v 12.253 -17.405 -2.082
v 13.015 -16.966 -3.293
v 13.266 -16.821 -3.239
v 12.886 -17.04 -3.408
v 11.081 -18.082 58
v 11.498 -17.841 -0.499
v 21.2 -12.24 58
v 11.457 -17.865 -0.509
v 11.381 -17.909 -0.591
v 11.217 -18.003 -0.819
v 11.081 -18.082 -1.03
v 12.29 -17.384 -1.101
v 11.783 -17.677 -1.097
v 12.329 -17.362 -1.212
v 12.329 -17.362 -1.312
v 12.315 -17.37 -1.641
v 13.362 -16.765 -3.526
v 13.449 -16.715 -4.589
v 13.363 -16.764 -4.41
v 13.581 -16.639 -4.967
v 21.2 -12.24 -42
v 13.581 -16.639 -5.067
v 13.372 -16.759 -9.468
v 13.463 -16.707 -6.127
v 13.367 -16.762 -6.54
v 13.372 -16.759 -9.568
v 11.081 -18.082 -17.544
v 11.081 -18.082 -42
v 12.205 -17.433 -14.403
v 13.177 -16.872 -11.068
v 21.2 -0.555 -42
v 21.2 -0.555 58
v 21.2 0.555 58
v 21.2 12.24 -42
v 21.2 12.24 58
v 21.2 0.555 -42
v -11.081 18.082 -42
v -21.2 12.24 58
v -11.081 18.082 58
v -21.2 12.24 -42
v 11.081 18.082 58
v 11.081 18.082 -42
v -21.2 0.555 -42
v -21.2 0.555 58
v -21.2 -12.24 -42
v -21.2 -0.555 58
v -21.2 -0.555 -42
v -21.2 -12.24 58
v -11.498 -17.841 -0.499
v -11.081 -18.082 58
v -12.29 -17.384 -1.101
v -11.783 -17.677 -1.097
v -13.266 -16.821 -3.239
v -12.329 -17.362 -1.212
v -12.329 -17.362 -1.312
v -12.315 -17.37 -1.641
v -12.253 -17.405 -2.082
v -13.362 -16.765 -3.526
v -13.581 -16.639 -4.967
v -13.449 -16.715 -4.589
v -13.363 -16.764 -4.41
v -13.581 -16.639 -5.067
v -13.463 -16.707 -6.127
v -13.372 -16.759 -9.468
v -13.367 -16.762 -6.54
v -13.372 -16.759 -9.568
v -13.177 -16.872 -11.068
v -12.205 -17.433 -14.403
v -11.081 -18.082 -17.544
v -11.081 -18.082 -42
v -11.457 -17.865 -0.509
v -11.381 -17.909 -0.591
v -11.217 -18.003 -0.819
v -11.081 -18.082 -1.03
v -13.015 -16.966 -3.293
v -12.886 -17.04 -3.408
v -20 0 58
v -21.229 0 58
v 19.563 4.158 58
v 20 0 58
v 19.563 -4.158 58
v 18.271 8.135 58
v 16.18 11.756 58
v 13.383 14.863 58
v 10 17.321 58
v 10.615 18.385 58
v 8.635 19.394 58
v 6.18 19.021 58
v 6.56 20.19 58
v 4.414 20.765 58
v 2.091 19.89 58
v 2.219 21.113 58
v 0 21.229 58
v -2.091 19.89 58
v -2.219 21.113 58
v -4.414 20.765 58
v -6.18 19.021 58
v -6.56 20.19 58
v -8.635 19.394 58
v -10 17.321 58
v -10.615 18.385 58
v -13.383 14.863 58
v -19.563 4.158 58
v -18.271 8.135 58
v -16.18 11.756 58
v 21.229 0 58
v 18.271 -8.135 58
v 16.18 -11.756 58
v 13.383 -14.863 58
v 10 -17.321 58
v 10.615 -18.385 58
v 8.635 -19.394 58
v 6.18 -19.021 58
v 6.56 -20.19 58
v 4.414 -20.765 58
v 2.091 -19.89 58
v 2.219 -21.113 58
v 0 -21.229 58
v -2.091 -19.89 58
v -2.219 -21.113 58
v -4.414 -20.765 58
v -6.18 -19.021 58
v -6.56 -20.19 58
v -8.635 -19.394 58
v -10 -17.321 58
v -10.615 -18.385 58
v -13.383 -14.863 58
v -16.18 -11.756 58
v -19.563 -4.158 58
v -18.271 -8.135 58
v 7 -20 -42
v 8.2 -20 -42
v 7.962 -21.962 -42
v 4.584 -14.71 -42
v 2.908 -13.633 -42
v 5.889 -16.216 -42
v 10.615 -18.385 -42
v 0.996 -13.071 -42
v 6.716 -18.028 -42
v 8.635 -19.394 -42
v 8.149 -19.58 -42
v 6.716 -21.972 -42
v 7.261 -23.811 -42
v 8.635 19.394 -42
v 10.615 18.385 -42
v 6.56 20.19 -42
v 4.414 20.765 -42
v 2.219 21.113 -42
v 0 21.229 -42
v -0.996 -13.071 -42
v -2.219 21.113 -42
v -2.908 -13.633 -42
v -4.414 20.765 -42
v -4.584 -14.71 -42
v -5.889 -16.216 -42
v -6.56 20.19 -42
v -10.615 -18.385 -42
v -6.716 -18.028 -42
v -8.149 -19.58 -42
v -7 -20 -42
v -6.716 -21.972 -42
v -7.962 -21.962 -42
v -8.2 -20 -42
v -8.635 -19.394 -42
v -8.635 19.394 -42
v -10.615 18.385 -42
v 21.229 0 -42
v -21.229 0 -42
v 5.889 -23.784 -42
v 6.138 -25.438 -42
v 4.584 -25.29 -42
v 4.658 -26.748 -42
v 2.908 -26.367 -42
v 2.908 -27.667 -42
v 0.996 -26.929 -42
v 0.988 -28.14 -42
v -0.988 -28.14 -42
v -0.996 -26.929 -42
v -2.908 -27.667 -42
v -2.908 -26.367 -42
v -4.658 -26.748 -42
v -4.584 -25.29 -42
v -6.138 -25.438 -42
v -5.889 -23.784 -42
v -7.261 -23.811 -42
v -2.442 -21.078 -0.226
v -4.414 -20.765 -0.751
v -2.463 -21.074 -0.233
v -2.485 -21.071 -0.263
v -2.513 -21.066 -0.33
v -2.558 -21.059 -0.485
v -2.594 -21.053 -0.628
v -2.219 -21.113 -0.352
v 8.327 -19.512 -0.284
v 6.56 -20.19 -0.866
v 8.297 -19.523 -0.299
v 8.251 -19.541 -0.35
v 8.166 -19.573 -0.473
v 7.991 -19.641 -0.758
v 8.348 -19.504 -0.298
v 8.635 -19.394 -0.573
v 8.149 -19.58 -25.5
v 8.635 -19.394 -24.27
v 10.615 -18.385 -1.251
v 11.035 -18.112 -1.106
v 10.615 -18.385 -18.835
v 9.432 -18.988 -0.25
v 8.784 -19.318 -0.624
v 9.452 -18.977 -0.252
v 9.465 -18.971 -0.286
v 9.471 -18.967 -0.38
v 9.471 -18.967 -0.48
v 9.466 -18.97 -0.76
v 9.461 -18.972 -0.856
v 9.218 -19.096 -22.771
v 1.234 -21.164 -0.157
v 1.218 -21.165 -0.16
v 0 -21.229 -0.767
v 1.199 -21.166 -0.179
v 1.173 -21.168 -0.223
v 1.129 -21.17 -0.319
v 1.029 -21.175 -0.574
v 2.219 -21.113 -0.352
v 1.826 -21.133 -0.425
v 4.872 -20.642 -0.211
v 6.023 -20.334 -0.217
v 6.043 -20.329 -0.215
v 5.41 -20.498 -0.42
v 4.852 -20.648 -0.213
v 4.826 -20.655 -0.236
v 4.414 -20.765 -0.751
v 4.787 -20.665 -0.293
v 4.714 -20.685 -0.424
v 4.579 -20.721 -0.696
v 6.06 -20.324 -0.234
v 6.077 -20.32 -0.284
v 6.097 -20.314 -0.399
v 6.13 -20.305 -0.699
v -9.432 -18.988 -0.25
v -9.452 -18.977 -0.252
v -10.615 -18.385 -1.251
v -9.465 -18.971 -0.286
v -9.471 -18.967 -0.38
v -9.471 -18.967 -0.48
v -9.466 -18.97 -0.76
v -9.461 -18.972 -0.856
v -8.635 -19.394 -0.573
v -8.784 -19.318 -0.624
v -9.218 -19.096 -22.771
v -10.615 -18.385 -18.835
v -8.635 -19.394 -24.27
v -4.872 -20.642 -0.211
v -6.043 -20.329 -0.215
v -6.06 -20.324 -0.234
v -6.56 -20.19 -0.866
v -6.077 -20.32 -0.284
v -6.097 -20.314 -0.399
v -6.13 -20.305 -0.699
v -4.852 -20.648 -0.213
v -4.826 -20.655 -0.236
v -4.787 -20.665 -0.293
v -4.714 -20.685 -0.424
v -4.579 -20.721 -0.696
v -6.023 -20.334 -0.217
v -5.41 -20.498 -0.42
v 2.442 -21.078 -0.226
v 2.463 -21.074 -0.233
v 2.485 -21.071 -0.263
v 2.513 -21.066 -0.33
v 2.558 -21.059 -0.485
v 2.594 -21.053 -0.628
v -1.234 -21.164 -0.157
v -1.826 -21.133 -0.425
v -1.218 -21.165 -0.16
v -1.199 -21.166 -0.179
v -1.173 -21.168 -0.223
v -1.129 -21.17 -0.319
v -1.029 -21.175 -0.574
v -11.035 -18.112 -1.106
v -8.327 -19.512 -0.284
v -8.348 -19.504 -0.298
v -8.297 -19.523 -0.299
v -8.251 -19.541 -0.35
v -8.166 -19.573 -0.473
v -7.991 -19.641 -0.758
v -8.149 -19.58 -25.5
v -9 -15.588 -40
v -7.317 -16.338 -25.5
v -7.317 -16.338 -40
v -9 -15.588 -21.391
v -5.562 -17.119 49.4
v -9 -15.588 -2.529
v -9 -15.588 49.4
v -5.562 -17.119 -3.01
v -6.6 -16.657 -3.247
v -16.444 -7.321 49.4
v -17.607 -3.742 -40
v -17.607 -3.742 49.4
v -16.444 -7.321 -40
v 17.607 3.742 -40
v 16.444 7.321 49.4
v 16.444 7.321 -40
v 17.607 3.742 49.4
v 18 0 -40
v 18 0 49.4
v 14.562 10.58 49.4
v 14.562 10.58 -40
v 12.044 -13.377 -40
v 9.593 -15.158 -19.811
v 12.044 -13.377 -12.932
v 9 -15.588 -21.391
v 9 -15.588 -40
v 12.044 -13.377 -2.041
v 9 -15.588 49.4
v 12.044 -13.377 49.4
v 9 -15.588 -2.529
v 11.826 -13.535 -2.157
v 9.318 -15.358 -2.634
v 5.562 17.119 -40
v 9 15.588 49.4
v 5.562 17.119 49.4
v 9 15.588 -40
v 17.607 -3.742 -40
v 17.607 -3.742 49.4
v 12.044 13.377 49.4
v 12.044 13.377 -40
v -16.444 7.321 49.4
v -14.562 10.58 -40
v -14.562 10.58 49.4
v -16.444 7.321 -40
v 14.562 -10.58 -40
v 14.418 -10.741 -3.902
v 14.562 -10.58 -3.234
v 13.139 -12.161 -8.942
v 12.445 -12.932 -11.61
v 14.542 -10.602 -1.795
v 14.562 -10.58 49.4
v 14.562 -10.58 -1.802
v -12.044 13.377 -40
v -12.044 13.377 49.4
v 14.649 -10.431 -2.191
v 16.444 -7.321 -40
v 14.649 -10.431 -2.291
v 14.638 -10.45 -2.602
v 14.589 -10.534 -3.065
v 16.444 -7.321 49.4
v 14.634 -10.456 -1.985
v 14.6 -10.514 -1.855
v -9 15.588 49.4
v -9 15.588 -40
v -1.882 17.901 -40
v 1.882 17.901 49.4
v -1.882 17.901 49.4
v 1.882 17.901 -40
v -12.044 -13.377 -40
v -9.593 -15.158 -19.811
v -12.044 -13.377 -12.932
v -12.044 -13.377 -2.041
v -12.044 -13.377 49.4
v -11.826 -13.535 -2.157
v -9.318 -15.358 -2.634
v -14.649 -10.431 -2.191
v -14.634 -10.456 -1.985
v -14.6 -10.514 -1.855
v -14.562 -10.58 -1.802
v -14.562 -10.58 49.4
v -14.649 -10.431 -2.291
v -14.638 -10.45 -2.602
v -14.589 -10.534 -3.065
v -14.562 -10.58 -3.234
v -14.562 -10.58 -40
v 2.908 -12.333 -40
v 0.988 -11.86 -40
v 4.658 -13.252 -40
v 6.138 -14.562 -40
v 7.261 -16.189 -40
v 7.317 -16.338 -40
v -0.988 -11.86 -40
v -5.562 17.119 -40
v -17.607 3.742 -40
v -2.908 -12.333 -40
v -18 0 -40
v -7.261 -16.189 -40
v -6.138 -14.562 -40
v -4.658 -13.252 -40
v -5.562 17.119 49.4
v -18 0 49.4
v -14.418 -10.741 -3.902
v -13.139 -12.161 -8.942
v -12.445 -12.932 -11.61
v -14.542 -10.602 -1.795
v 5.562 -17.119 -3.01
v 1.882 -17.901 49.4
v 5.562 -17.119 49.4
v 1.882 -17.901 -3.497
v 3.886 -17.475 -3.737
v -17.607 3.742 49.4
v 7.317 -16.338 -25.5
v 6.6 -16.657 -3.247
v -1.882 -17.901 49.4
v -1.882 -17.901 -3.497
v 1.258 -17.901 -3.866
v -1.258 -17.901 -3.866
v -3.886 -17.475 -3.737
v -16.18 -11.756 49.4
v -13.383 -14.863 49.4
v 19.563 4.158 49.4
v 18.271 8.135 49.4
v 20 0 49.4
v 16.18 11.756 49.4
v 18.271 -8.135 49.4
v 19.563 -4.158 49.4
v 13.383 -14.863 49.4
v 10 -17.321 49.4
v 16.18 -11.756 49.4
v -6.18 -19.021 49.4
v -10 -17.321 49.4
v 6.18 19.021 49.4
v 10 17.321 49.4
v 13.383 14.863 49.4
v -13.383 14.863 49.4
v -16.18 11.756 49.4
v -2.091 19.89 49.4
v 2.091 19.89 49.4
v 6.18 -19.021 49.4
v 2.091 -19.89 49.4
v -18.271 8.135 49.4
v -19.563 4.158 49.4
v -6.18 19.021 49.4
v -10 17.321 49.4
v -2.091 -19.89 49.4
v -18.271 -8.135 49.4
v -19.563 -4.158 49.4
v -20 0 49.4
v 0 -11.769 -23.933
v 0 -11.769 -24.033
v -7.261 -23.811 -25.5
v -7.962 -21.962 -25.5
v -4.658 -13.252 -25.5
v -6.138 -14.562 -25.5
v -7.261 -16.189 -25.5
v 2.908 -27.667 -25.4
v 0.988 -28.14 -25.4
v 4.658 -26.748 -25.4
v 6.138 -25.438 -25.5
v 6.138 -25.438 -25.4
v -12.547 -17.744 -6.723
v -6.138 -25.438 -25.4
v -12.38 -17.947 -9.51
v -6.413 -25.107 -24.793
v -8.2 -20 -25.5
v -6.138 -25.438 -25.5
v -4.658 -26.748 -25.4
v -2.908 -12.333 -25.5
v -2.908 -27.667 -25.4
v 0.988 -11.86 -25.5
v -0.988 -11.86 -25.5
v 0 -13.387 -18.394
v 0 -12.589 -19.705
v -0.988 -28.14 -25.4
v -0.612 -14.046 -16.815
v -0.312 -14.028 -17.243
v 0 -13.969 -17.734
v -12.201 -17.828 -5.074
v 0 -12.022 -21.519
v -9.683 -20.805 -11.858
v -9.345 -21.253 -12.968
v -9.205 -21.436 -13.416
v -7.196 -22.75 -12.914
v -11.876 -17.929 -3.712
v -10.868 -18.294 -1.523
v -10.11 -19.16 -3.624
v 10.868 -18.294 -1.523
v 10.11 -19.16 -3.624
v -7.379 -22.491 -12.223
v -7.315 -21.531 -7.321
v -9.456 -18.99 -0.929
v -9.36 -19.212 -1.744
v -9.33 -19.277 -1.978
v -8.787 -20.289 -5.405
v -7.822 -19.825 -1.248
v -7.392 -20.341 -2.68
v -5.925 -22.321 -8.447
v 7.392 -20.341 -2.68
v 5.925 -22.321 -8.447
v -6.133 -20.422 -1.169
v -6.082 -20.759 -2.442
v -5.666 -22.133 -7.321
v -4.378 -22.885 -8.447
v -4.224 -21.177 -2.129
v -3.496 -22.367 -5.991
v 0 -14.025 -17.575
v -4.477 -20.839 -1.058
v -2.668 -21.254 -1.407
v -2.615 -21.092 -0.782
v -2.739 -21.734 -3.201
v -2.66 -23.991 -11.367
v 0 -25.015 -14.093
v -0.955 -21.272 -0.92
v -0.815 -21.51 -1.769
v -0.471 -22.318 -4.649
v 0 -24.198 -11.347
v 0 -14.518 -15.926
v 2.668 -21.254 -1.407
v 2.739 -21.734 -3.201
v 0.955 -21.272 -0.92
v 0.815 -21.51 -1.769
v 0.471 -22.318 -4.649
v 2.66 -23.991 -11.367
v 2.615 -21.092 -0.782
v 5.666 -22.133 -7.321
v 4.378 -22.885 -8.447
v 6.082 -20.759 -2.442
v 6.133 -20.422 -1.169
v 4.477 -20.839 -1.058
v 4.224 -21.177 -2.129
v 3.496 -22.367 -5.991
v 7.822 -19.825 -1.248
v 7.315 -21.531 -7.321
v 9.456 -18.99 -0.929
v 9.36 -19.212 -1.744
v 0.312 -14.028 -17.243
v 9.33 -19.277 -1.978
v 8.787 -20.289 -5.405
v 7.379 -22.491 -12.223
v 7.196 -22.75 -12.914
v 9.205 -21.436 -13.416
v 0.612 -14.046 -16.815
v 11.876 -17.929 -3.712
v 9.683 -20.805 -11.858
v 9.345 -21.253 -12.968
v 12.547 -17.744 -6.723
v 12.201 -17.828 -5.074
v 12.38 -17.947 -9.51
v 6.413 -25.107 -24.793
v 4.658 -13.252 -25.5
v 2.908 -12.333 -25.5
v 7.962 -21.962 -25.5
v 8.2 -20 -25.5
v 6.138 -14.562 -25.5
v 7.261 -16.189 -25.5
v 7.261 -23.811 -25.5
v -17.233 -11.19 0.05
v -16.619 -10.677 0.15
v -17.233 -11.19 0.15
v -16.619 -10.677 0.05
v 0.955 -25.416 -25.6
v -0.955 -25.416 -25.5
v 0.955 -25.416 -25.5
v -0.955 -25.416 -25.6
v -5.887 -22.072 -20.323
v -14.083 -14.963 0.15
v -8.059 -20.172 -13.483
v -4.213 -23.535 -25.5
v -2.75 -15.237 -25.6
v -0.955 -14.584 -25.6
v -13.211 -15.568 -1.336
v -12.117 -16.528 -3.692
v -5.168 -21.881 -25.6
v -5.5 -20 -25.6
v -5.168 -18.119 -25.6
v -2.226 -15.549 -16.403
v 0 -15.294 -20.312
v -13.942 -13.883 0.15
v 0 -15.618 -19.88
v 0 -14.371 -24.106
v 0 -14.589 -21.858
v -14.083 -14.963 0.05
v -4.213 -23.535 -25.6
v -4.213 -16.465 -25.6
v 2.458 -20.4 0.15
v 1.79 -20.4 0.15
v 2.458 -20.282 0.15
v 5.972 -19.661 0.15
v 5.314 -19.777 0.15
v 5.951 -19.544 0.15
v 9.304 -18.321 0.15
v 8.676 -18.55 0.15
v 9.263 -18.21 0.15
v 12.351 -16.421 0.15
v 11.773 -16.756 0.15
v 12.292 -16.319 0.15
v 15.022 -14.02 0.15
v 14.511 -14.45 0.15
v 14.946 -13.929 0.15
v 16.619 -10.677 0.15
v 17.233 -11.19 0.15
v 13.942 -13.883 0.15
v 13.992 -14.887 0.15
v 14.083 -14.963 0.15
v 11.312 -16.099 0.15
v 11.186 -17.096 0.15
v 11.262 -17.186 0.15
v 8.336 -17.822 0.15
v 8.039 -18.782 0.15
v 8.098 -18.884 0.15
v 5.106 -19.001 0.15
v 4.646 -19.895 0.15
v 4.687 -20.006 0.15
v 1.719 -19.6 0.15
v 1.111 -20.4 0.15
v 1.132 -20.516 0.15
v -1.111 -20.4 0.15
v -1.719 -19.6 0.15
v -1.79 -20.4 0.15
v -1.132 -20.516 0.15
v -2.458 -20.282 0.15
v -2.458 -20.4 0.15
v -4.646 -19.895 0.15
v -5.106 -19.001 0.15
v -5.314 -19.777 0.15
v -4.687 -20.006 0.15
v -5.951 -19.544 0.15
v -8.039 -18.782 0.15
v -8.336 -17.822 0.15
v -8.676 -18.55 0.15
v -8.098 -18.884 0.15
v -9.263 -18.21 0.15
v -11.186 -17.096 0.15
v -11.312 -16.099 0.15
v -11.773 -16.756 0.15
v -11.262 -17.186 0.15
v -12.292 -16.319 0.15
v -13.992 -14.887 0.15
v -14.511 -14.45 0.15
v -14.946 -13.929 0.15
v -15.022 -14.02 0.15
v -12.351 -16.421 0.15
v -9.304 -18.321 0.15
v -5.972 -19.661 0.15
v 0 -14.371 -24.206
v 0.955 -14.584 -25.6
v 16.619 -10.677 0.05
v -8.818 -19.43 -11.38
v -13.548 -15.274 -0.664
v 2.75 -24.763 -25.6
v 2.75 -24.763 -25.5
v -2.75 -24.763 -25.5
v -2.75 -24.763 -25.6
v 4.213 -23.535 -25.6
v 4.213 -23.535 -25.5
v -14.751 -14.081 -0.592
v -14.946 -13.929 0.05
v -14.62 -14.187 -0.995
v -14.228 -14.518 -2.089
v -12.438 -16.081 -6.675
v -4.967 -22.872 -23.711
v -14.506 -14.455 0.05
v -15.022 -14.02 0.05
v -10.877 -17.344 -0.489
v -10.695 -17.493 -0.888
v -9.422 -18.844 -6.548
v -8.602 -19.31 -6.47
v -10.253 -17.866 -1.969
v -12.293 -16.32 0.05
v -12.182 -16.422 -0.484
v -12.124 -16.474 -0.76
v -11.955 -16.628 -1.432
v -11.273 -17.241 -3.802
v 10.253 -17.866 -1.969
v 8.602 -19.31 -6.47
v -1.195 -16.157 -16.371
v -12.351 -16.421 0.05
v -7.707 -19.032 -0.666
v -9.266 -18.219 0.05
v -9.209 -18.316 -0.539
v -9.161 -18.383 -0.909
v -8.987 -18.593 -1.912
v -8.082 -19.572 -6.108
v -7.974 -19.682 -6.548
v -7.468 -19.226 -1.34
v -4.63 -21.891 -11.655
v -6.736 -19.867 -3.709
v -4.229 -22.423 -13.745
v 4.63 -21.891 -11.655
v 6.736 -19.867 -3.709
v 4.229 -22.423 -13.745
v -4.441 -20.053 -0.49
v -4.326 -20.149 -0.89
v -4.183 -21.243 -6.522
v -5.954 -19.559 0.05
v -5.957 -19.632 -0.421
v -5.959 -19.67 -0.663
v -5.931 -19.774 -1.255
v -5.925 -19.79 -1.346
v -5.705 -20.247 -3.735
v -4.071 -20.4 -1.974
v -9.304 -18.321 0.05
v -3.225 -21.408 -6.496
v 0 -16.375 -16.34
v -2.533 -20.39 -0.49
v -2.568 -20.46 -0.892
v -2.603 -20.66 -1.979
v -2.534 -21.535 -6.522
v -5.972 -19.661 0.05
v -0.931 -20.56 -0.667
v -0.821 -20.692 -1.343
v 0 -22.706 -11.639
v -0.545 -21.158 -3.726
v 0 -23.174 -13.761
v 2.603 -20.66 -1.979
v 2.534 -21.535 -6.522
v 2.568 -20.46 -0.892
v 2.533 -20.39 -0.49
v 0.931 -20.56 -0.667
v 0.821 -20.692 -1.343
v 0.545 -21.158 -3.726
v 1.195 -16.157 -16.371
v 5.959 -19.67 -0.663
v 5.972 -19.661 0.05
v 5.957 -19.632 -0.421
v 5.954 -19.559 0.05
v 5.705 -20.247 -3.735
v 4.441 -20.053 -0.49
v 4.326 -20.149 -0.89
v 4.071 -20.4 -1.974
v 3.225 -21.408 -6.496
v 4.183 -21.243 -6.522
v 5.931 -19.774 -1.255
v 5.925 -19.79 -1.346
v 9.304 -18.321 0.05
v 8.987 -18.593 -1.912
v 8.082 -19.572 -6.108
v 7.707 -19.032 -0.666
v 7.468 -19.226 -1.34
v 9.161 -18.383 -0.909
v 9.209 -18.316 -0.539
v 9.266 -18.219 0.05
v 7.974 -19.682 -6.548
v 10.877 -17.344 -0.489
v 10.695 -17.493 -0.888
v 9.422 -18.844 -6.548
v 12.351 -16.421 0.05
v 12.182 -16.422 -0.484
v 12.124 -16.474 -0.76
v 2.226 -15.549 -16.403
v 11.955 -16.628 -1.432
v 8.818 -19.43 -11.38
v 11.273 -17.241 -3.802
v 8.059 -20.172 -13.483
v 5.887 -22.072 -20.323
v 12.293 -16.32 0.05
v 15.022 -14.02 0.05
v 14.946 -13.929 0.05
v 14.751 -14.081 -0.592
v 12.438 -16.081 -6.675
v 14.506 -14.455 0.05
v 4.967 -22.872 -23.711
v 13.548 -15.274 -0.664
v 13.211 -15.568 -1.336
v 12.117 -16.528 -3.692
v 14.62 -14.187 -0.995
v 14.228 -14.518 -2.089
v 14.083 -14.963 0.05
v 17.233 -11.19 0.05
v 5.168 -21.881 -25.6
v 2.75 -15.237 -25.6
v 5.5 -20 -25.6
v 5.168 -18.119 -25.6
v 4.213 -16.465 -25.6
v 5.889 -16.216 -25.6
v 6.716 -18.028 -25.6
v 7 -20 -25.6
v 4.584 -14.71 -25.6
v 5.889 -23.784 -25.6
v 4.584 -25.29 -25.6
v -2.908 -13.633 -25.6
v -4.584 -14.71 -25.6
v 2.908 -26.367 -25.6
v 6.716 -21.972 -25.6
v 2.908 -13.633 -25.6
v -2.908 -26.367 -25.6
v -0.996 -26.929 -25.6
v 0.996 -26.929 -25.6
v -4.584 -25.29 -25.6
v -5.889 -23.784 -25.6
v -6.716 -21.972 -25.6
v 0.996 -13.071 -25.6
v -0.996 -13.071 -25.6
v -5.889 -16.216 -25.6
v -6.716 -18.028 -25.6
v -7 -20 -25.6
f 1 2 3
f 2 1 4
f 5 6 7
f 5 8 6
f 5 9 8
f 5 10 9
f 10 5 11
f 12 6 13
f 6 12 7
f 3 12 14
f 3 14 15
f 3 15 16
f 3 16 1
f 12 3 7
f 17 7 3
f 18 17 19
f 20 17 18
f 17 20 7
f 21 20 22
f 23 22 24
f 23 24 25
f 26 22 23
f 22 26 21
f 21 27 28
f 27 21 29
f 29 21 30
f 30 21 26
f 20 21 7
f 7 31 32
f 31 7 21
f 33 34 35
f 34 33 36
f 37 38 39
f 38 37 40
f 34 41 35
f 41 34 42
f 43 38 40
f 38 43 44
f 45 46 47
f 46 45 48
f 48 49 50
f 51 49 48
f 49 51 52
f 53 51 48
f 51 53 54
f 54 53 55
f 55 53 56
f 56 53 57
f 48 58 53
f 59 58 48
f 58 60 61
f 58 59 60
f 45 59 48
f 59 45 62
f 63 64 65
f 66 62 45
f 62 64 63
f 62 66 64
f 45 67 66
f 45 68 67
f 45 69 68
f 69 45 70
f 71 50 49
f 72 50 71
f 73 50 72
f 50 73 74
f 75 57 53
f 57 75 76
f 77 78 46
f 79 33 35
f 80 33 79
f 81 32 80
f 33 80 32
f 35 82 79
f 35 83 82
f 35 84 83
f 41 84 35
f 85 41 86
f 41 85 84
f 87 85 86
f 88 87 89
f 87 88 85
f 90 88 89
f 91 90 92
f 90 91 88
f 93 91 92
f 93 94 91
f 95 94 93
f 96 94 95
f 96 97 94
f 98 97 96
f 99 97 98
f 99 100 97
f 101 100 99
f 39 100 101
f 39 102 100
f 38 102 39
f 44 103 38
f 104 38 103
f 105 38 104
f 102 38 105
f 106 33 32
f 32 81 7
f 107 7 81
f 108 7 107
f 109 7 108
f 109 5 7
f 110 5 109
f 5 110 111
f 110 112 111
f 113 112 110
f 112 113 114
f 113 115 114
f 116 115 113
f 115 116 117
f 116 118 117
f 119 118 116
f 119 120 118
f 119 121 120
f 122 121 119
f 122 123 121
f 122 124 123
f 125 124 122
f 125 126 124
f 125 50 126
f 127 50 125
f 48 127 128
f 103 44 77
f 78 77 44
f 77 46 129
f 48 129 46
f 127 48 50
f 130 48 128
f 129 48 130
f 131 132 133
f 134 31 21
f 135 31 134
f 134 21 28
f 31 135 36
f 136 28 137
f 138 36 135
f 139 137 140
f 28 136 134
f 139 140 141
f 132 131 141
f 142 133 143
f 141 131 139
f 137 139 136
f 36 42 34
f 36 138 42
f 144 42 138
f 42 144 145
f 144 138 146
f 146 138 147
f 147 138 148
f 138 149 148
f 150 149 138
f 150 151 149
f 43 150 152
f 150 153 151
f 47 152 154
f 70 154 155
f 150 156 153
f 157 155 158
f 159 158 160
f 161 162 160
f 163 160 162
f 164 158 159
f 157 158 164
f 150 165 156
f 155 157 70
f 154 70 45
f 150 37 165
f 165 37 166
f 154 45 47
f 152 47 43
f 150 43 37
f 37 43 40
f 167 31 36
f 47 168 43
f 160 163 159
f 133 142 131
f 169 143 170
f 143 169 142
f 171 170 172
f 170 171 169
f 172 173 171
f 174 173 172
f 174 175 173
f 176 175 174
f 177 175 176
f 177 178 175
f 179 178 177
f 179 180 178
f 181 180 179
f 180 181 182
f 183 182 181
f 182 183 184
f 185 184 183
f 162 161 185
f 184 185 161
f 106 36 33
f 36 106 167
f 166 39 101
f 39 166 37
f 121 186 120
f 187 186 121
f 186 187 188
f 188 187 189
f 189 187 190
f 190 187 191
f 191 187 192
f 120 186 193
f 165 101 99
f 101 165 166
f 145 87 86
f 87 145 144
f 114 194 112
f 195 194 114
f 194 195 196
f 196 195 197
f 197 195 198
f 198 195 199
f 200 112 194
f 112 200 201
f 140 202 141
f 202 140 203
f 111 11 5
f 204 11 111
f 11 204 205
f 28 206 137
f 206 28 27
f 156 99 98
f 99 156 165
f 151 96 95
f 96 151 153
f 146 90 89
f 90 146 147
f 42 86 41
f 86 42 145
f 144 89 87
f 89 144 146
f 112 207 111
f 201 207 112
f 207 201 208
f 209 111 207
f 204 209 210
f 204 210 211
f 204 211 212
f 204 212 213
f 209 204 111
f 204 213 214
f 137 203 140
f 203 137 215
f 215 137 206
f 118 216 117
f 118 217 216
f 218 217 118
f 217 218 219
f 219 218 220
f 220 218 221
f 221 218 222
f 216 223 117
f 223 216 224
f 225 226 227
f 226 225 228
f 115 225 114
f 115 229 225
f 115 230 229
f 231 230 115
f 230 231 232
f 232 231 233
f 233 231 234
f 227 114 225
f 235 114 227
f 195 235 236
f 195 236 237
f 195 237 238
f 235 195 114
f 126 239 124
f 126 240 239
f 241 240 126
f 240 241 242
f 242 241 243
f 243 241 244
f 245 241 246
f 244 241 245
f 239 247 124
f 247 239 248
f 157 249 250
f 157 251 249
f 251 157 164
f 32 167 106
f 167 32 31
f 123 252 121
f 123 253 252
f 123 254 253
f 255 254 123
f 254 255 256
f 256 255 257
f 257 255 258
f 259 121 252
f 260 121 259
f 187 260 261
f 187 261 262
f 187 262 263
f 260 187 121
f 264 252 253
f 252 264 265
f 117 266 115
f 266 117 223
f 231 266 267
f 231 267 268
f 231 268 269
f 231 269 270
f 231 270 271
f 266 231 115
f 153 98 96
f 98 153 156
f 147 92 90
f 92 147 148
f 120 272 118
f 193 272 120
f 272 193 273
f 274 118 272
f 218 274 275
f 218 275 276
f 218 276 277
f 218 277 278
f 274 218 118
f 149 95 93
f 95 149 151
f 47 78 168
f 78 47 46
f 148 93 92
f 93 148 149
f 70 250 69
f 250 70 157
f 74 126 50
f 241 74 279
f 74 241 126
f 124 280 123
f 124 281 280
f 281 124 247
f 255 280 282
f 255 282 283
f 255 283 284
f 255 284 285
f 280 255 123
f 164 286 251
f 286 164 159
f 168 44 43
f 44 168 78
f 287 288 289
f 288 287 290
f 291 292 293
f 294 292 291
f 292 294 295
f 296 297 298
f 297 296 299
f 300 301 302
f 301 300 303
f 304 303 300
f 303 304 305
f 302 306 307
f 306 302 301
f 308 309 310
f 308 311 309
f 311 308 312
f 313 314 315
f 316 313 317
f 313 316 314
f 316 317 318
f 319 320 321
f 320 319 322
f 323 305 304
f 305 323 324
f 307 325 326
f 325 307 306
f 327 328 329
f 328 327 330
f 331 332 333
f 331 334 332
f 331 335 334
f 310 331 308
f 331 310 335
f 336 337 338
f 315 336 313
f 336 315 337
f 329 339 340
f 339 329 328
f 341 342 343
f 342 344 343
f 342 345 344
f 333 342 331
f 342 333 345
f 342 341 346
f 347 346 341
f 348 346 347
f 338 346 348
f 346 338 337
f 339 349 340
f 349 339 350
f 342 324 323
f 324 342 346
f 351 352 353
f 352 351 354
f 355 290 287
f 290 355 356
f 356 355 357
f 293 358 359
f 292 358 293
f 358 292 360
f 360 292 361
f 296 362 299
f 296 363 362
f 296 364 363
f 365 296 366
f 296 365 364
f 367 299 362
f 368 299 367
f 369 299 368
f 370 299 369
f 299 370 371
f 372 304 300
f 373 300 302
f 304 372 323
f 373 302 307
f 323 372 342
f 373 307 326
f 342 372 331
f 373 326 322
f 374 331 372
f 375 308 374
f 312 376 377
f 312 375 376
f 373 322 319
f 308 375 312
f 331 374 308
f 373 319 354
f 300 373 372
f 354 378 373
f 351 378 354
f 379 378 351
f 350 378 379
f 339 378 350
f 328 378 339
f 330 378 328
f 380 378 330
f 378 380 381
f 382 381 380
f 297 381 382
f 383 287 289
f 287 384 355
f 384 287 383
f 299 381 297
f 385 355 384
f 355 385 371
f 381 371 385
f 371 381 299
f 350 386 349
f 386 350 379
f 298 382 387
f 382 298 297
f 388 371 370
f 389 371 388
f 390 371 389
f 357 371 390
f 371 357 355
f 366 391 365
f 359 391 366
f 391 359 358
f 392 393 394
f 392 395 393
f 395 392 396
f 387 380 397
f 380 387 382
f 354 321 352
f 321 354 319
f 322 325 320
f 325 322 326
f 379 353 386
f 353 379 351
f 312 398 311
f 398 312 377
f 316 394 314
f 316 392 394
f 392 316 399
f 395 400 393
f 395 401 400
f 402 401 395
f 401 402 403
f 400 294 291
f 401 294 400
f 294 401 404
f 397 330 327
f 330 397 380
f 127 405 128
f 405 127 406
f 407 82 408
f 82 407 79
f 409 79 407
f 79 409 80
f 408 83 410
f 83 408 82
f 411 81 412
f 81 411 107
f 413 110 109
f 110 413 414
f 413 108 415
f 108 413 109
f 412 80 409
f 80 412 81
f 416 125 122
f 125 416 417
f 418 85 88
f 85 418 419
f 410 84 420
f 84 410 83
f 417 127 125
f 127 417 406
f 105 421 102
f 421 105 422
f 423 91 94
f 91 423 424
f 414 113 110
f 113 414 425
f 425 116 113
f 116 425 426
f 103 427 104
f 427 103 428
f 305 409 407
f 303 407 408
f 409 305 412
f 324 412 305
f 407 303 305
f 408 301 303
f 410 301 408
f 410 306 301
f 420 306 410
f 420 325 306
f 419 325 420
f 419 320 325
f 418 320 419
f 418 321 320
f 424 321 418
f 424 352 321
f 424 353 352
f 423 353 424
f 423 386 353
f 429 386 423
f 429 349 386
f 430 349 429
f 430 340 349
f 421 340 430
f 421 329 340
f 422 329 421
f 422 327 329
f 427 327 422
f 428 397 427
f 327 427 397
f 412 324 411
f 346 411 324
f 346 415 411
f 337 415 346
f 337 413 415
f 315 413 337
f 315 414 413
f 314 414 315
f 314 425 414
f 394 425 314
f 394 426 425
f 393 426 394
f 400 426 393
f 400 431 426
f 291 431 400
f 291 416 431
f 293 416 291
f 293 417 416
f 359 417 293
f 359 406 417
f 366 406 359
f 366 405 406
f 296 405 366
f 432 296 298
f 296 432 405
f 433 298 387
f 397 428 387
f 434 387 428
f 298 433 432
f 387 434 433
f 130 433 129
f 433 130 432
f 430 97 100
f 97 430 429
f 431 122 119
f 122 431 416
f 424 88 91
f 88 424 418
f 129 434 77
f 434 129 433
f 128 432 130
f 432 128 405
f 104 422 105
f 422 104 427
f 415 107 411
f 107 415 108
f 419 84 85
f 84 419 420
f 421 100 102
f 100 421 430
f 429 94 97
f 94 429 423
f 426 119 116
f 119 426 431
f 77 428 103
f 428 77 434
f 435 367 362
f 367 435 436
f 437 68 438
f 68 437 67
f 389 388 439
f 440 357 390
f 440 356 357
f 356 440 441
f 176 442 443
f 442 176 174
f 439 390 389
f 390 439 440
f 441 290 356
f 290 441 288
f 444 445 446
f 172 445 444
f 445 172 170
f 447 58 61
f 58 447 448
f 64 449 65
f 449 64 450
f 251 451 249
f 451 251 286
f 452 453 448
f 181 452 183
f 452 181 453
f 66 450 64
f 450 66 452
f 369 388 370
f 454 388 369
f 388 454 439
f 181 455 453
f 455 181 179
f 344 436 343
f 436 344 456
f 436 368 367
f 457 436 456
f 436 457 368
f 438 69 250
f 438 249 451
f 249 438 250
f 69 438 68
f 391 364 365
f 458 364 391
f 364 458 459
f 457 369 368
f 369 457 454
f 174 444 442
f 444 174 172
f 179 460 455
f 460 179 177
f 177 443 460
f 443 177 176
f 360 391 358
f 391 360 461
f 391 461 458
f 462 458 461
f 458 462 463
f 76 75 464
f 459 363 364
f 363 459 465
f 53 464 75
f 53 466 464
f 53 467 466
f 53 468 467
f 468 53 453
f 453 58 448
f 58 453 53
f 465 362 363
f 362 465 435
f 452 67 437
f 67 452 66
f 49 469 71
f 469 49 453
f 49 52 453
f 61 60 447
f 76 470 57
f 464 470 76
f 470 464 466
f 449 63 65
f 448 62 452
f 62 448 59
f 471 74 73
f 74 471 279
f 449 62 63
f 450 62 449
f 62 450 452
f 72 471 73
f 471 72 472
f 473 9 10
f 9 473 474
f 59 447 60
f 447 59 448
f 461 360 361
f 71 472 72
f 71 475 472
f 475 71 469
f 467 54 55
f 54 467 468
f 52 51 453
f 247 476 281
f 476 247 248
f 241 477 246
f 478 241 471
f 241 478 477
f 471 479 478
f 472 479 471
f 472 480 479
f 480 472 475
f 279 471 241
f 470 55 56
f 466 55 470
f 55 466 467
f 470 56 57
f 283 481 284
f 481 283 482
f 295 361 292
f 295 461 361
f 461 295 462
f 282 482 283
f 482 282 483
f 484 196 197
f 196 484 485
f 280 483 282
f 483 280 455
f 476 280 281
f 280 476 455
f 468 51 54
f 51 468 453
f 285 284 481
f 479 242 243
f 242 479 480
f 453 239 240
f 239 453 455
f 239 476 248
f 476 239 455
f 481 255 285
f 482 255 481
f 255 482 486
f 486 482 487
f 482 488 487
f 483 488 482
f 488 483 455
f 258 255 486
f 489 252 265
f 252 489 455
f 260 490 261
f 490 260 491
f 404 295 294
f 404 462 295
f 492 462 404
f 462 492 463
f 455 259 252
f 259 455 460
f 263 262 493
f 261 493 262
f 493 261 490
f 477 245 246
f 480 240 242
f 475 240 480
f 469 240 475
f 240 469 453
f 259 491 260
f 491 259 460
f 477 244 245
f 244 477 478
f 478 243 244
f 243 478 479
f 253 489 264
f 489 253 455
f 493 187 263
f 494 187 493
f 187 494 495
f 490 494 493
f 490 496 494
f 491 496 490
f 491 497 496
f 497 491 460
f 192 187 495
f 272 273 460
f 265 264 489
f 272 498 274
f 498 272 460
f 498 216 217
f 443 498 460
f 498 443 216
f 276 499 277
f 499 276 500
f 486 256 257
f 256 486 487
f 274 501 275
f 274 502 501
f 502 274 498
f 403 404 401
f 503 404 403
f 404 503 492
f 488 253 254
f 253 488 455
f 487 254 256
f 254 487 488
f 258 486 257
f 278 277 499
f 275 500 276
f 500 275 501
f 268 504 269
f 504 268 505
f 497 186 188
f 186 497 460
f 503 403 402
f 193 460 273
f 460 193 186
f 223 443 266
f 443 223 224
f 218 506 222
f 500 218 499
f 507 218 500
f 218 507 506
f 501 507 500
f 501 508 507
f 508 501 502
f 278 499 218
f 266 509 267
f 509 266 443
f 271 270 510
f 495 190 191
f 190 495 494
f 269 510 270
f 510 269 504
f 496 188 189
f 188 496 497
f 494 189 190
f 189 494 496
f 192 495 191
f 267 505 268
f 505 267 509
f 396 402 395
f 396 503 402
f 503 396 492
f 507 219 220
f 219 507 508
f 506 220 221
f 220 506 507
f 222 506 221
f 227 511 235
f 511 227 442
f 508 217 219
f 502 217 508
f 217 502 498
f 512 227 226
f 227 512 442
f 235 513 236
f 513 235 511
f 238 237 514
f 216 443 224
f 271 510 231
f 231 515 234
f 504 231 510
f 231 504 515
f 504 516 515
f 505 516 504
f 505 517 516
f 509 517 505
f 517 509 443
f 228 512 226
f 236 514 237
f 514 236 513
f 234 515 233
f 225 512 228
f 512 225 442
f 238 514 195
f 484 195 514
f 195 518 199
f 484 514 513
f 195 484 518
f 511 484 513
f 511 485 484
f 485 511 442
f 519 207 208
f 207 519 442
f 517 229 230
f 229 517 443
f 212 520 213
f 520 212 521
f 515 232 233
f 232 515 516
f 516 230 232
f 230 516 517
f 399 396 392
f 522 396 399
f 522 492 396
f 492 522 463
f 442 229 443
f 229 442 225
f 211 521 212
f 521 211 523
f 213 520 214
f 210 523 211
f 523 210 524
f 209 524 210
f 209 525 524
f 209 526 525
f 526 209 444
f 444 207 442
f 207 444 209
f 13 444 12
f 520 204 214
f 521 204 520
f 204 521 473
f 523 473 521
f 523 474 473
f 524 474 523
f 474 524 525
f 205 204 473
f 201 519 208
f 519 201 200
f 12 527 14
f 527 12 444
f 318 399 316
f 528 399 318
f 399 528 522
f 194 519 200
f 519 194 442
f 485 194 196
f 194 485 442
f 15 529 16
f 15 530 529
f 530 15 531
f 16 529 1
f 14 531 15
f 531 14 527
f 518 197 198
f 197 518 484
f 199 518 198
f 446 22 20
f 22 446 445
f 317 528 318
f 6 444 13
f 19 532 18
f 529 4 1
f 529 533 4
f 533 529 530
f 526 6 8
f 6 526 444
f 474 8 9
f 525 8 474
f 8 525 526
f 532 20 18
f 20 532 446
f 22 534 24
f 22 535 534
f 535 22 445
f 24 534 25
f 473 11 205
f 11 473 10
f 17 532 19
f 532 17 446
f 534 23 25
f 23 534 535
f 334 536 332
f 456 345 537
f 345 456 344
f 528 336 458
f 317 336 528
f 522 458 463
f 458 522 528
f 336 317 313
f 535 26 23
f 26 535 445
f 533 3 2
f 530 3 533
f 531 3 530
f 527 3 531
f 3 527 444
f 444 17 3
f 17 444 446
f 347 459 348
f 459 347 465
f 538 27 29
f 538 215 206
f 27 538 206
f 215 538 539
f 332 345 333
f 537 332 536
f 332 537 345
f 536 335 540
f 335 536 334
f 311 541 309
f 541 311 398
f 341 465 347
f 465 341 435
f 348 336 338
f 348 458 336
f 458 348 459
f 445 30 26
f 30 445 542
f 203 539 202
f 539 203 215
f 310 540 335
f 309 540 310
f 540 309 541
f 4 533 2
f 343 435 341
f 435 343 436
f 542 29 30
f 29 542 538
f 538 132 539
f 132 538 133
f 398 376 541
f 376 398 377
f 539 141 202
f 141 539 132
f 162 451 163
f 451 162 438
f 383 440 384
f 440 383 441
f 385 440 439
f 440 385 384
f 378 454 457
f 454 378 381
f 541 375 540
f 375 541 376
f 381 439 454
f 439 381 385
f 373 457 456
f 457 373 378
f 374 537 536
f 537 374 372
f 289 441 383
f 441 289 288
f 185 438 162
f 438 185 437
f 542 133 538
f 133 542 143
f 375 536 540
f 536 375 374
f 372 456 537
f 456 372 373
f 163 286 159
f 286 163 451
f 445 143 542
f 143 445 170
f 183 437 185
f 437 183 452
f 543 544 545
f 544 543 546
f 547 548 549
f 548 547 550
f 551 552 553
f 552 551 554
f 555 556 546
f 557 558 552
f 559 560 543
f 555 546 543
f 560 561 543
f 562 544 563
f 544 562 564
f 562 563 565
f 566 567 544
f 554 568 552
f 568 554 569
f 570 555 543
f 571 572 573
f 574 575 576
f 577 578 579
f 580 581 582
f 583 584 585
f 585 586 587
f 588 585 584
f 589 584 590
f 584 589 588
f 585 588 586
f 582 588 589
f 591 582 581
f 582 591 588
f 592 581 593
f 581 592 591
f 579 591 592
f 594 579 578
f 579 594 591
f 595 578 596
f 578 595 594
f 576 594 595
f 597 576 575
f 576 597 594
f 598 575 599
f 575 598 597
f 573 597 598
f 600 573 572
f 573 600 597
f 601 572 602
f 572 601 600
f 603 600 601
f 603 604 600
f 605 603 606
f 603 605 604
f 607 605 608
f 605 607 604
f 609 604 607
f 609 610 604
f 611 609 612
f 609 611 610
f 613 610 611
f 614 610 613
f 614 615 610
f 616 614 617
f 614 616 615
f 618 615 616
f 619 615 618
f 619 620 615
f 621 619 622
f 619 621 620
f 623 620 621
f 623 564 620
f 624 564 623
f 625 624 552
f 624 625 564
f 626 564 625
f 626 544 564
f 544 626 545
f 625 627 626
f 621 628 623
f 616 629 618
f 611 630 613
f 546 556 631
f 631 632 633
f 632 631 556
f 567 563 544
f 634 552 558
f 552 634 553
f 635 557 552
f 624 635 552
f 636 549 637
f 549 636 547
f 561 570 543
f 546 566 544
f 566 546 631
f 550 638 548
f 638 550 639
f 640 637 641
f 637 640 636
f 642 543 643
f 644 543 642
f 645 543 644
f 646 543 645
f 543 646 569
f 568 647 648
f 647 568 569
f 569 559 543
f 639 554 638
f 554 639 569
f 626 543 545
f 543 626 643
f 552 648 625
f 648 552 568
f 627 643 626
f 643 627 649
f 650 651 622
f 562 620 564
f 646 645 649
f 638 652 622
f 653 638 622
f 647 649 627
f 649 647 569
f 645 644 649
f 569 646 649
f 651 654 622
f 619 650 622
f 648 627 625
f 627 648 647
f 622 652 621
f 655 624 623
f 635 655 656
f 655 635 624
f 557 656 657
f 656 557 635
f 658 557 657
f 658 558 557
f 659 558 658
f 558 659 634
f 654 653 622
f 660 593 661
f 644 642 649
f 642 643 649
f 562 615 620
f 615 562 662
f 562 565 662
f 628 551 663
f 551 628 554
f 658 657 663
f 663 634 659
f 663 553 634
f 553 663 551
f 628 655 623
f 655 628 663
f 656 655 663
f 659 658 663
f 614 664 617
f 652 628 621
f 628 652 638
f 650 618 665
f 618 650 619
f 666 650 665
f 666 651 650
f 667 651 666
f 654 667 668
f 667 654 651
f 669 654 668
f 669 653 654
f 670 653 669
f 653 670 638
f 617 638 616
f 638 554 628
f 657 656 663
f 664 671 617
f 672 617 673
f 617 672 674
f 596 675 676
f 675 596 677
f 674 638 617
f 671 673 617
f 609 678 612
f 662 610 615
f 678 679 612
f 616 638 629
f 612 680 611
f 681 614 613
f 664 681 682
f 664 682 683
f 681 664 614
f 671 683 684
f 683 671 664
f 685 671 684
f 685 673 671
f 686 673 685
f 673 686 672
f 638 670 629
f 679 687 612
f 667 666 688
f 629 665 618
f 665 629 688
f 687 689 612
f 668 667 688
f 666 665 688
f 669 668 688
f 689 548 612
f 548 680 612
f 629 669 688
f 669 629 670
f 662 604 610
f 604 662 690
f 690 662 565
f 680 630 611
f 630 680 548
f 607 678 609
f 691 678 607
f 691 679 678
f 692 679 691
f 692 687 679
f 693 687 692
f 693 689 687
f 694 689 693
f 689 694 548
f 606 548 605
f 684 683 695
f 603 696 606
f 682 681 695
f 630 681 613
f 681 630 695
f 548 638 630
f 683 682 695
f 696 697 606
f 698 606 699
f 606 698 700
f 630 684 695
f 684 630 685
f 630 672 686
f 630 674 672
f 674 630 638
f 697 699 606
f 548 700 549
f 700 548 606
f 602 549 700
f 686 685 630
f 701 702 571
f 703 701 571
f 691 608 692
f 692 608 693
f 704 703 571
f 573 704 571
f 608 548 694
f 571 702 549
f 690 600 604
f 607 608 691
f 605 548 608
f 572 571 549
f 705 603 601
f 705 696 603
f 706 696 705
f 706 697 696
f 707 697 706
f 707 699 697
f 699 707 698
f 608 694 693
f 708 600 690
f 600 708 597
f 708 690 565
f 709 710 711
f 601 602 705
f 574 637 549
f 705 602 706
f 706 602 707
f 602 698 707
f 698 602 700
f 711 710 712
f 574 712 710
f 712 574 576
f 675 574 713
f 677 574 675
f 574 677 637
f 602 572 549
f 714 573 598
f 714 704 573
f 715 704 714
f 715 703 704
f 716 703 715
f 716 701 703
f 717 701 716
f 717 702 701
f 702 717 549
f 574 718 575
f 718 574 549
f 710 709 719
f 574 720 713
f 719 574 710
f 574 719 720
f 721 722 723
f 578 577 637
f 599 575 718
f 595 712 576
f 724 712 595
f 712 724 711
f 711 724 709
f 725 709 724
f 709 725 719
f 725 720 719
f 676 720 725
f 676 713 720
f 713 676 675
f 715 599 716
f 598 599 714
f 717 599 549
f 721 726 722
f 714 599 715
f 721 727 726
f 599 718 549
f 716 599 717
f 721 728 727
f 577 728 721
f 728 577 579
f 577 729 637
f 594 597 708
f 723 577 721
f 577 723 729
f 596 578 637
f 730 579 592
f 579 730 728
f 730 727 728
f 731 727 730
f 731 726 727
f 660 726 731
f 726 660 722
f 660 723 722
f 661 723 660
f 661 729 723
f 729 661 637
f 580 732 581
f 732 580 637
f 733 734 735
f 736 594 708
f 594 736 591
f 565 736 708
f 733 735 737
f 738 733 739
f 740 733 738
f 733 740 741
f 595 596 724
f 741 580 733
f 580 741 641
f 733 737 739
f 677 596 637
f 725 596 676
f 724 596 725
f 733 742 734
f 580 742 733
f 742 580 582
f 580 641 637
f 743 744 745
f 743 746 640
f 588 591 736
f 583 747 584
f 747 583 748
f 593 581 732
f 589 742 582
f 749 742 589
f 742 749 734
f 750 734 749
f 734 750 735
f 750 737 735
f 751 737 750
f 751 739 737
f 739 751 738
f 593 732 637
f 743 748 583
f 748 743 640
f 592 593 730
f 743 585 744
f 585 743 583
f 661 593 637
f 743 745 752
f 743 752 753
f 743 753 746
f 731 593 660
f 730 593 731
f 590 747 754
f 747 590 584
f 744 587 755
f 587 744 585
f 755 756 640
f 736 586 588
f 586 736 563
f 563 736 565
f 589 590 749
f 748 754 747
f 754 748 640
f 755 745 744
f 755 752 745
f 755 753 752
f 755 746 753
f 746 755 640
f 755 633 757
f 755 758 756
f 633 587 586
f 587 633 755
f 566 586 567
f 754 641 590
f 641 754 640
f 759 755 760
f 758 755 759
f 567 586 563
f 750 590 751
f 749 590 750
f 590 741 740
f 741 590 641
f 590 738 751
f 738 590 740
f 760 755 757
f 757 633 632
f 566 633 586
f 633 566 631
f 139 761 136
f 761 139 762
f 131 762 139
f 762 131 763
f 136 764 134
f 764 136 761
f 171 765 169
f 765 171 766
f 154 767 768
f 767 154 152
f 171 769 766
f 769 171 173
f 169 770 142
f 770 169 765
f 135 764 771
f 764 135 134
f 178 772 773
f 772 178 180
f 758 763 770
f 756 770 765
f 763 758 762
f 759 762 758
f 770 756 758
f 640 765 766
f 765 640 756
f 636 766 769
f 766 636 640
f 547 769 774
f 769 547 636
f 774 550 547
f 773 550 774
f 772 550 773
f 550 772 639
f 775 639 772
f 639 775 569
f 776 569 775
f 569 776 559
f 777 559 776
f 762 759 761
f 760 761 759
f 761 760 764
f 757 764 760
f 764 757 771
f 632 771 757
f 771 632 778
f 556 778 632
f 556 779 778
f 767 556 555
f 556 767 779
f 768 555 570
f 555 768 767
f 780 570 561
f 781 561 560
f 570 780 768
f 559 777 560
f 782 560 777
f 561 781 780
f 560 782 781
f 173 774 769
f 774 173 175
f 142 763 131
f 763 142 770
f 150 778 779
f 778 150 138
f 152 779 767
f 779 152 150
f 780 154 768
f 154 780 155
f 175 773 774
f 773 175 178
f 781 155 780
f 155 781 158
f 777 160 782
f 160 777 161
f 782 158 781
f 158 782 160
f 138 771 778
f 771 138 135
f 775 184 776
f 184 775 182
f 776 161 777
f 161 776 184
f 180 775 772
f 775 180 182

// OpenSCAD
// variables
outerDiameter = 40;
innerDiameter = 36;
labiumWidth = 35;
outCut = 10;
lengthFlue = 40; //coordinate this with the frequency
outerTube = 14;
innerTube = 11;
minWallThickness = 1.2;
floorThickness = 2;
flueWidth = 0.8;
flueSteps = 10;

// proportions
tubeInsert = outerTube + 2.5; // length
pipeInsert = innerDiameter * 0.1 + 5; // length

// calculations, don't touch in daily use
labiumY = sin(labiumWidth * 180 / outerDiameter / PI) * outerDiameter; 
angle = labiumWidth * 360 / outerDiameter / PI;
ground = (lengthFlue + floorThickness)*-1;
flueStepWidth = labiumWidth * 180 / (outerDiameter+flueWidth) / PI / flueSteps;

// flueLength warning
if (lengthFlue < outerTube * 2)
    echo("lengthFlue is too short");
    
module cylinder_outer(height,radius,fn){  	//from https://en.wikibooks.org/wiki/OpenSCAD_User_Manual/undersized_circular_objects
   fudge = 1/cos(180/fn);
   cylinder(h=height,r=radius*fudge,$fn=fn);
}
   
module basicShape(height)
translate ([0, 0, ground]) union(){
    difference(){
	   	union(){
	        intersection (){
	            rotate ([0, 0, 30]) cylinder_outer(height, (outerDiameter*0.5+minWallThickness), 6);
	            translate ([0,0,50]) cube ([outerDiameter*2, (sqrt(3)*(outerDiameter*0.5+minWallThickness)), height], center = true);
	 	        };
	        cylinder_outer(height, (outerDiameter*0.5 + minWallThickness), 60);
	    	};
        union(){
        	translate ([0, 0, floorThickness]) cylinder(height, d=innerDiameter, center=false);
        	translate ([0, 0, (height - pipeInsert)]) cylinder(height, d=outerDiameter, center=false);
        };
    };
};
   
module curvedFlueLoft(upperDiameter, lowerDiameter, loftCeiling, loftFloor){
    union(){
        translate([0, (outerDiameter*-0.5), loftFloor]) cylinder (h=(tubeInsert+0.1), d=lowerDiameter);
        for (a = [(angle*-0.5) : (angle/flueSteps) : (angle*0.5)])
            hull () {
            rotate ([0, 0, a]) translate ([0, (outerDiameter*-0.5), loftCeiling]) cube ([flueStepWidth, upperDiameter, 0.1], center=true);
            translate ([0, (outerDiameter*-0.5), (loftFloor + tubeInsert)]) cylinder (0.1, d=lowerDiameter);
        };
    };
}

module outerCurvedLoft(){
    curvedFlueLoft(    
        upperDiameter = (flueWidth + minWallThickness), 
        lowerDiameter = (outerTube + 2 * minWallThickness),
        loftCeiling = 0,
        loftFloor = ground
    );
}

module innerCurvedLoft(){
    curvedFlueLoft(
        upperDiameter = flueWidth, 
        lowerDiameter = innerTube, 
        loftCeiling = 0.1, 
        loftFloor = (ground-0.1)
    ); 
}

module airSupplySpacer(){
    translate ([0, (outerDiameter*-0.5), (ground-0.1)]) 
    cylinder (tubeInsert, d=outerTube, center=false);
}

// logic
difference(){
    union(){
        basicShape(100); // die 100 ist testweise, muss die Höhe noch entscheiden
        outerCurvedLoft();
    };
    union(){
        innerCurvedLoft(); 
        airSupplySpacer();
    };
};

/* todo:
mal bzgl 
Labiumcut
figure out scaling
assembly
*/

echo(version=version());
